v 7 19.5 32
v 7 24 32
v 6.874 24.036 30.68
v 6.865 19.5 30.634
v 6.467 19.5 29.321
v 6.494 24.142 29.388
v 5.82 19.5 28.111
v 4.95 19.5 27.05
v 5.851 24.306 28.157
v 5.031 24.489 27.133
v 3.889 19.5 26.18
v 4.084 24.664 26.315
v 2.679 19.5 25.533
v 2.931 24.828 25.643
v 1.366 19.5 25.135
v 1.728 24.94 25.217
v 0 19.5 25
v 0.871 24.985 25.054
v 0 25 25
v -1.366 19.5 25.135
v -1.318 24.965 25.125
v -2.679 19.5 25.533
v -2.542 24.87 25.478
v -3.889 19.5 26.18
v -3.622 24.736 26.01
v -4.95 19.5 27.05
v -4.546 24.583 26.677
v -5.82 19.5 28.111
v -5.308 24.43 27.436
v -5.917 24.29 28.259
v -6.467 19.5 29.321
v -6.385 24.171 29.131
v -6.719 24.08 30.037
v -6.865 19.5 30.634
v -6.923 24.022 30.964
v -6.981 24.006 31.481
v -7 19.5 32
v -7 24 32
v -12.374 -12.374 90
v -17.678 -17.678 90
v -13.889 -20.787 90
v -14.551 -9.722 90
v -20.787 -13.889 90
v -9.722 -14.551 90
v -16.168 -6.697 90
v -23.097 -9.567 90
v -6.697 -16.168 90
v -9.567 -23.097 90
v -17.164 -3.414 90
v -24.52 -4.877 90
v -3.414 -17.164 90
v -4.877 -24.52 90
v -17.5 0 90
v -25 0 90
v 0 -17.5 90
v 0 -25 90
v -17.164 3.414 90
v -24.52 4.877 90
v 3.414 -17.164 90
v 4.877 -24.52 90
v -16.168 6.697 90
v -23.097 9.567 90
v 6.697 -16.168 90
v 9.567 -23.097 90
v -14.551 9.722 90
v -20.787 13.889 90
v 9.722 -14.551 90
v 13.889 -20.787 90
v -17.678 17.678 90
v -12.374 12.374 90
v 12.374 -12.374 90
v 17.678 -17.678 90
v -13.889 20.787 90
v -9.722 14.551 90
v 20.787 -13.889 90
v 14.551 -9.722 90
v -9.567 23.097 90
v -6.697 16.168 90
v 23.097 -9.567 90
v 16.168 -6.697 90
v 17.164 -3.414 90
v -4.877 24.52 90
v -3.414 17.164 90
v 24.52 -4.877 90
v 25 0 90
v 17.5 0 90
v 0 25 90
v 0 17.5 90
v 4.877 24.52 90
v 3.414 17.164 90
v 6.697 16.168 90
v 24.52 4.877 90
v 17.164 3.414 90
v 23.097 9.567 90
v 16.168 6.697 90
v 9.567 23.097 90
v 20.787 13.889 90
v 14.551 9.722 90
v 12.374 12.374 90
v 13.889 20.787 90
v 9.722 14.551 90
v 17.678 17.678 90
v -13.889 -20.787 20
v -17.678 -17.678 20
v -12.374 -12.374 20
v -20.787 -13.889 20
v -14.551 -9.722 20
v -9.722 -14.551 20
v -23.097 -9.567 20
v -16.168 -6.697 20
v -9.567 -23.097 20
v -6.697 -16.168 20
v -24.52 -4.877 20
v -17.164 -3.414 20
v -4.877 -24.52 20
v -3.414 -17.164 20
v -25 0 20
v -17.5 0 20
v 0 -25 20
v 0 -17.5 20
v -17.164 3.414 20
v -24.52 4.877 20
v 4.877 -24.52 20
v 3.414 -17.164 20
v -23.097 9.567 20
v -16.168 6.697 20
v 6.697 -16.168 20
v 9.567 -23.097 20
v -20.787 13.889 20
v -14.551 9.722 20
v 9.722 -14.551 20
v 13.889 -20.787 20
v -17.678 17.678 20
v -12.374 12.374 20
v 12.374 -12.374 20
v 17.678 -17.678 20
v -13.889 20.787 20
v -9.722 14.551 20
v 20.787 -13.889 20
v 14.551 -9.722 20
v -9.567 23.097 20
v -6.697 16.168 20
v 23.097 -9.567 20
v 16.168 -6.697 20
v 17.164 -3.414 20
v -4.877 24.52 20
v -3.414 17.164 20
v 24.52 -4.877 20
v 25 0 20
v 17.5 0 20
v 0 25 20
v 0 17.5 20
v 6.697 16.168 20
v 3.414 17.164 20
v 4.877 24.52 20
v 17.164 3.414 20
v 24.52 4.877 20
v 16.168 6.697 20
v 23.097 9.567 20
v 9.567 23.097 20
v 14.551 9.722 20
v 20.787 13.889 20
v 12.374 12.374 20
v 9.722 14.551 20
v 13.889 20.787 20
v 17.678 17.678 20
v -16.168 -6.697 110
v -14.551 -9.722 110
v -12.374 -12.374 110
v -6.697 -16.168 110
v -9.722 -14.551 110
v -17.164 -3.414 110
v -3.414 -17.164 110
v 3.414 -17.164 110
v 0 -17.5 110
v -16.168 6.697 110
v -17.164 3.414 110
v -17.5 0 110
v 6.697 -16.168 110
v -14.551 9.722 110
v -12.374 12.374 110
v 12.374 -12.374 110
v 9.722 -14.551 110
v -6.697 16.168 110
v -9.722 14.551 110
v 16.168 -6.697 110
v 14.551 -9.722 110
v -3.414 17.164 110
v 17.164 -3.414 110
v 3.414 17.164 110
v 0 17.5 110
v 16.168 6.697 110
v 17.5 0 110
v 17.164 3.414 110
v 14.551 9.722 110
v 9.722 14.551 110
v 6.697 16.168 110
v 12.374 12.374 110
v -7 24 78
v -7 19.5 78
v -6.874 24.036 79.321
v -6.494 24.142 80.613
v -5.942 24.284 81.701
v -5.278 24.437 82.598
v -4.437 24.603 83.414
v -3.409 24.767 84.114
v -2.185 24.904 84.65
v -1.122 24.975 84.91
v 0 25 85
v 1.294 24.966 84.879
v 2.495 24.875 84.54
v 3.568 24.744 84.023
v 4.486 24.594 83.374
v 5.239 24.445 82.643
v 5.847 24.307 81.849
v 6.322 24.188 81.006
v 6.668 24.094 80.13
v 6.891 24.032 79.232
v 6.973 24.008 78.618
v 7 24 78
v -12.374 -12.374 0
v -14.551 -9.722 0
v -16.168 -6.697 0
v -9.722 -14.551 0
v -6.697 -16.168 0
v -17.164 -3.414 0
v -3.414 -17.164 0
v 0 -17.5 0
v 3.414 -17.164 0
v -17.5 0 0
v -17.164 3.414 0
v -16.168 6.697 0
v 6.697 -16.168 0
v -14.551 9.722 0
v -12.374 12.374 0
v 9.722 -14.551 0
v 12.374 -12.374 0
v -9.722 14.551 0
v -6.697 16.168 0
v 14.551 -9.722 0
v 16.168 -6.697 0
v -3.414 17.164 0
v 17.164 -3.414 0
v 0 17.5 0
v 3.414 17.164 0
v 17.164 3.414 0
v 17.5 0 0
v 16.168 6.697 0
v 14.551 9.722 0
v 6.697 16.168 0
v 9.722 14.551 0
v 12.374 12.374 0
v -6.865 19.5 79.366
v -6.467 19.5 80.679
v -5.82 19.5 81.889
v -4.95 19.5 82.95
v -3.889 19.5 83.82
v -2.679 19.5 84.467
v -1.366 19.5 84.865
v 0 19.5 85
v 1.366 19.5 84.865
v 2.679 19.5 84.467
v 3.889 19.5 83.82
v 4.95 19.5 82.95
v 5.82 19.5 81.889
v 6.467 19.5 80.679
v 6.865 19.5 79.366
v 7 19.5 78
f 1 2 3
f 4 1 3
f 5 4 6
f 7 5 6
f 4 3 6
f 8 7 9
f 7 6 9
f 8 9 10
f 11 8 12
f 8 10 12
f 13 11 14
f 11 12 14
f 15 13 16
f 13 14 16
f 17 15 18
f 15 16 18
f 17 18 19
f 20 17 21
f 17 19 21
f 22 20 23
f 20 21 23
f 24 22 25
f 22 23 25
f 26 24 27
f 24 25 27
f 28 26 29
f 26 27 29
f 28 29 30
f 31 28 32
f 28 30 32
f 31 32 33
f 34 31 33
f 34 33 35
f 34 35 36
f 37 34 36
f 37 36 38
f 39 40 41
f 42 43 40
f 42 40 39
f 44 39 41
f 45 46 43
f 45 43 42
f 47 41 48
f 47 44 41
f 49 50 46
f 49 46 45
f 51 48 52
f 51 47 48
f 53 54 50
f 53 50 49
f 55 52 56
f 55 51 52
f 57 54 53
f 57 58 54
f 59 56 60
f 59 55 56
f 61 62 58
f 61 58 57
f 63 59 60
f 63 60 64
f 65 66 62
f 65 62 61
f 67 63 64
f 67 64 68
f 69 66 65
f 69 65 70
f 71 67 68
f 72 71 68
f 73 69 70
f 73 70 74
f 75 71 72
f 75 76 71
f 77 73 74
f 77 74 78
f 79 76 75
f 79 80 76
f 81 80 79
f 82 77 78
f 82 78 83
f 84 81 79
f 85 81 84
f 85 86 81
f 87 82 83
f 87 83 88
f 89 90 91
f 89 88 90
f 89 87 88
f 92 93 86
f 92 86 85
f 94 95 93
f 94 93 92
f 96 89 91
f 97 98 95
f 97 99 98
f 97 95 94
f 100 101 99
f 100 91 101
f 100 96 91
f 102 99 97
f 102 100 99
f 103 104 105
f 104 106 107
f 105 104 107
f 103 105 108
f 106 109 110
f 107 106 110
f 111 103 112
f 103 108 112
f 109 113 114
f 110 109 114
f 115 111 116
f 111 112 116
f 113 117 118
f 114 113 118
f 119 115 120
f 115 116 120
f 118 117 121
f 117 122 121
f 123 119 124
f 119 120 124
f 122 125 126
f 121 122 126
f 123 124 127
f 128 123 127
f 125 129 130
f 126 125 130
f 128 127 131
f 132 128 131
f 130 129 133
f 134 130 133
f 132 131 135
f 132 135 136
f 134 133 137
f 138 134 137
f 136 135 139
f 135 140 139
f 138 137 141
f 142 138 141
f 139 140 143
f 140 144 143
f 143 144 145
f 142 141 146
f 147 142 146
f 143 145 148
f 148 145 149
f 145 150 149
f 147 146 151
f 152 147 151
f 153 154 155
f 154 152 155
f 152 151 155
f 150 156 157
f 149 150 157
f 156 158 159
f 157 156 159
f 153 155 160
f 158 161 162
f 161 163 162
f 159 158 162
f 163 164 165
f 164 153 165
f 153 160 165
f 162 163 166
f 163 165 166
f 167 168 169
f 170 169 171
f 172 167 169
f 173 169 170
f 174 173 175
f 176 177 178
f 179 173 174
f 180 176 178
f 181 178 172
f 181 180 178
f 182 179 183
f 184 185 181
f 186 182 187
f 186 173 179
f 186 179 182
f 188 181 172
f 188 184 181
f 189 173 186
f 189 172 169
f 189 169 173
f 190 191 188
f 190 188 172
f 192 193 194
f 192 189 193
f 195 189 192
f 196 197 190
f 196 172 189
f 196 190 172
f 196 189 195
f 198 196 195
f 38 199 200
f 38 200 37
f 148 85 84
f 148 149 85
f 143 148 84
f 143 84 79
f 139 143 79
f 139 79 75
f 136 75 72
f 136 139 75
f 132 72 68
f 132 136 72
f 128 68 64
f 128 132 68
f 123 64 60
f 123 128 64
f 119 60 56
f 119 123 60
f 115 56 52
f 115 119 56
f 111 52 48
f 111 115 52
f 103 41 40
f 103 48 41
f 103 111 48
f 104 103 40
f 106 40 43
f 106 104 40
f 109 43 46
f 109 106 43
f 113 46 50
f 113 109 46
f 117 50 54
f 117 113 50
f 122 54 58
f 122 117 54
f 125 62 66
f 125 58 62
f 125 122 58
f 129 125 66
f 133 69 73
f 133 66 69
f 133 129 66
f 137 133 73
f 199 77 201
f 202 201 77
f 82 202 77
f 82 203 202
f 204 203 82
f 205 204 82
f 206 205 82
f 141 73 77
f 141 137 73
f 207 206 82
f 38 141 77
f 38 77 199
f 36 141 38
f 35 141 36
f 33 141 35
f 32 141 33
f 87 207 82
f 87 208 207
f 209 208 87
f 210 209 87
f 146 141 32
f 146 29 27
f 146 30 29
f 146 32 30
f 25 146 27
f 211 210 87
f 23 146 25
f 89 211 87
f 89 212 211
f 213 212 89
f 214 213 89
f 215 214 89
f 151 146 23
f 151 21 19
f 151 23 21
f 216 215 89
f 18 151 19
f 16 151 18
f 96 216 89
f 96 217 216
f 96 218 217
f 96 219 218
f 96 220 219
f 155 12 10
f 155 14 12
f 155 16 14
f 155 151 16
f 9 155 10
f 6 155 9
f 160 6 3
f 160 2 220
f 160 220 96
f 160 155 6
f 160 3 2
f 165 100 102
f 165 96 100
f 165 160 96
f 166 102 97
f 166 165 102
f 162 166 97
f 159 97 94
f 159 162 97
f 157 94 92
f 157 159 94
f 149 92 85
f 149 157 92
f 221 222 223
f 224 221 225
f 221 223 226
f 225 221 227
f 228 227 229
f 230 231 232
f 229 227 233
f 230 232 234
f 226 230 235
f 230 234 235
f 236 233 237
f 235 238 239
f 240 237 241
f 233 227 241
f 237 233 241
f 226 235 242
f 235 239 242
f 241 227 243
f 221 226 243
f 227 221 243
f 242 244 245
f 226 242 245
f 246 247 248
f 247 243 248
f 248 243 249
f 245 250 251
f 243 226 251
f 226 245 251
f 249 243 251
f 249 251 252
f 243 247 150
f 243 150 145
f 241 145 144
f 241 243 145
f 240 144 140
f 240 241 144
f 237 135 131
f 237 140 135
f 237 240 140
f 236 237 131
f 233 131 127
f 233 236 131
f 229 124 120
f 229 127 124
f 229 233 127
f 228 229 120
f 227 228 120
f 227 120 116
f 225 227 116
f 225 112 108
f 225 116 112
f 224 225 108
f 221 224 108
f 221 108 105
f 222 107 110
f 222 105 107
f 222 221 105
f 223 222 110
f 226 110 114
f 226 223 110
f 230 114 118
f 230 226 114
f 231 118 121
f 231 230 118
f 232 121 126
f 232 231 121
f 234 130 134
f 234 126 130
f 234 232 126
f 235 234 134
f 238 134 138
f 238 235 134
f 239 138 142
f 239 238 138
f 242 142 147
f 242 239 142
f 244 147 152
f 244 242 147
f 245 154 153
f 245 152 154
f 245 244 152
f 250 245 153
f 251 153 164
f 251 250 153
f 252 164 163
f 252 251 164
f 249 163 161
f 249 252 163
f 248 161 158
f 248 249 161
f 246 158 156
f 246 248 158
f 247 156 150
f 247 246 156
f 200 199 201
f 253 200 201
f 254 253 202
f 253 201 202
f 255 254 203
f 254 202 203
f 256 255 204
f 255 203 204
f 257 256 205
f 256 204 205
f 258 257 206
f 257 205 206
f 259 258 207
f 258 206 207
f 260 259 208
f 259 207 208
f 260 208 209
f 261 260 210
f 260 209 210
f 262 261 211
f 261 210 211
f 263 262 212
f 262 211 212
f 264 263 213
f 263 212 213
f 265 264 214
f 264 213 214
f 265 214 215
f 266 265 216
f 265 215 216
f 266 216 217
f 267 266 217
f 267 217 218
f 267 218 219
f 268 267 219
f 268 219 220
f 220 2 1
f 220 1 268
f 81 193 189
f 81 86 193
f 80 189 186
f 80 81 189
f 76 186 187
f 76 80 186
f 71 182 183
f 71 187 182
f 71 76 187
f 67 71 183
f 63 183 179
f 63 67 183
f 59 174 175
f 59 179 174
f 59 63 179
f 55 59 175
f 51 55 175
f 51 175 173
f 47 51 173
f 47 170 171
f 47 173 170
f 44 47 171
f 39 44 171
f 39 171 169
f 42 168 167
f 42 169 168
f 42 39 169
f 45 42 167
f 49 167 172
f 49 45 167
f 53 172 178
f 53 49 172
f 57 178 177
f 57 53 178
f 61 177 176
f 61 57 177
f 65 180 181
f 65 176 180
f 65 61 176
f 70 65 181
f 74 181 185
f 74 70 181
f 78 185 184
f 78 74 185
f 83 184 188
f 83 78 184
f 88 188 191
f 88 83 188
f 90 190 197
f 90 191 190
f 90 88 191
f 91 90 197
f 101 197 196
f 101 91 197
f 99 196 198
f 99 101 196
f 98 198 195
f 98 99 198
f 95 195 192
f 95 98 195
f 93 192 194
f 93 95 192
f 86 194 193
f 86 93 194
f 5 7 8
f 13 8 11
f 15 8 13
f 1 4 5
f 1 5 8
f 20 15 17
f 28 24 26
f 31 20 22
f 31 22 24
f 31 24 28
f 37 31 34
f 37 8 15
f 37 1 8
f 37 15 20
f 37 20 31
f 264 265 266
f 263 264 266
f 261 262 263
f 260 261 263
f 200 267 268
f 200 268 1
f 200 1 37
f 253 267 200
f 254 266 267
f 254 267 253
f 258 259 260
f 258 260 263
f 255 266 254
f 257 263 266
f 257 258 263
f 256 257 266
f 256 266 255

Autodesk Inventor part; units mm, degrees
sketch "スケッチ1" plane through (0, 0, 0) normal (0, 0, 1) x (1, 0, 0)
  circle A0 centre (0, 0) radius 17.5
  dimension "d0" = 35
extrude "押し出し1" add sketch "スケッチ1" along normal blind 20
sketch "スケッチ2" plane through (0, 0, 20) normal (0, 0, 1) x (1, 0, 0)
  circle A0 centre (0, 0) radius 25
  dimension "d3" = 50
extrude "押し出し2" add sketch "スケッチ2" along normal blind 70
sketch "スケッチ3" plane through (0, 0, 90) normal (0, 0, 1) x (1, 0, 0)
  circle A0 centre (0, 0) radius 17.5
  dimension "d6" = 35
extrude "押し出し3" add sketch "スケッチ3" along normal blind 20
sketch "スケッチ4" plane through (0, 0, 0) normal (1, 0, 0) x (0, 1, 0)
  point P0 (0, 0)
ref_plane "作業平面2" through (0, 0, 55) normal (0, 0, 1) x (1, 0, 0)
ref_plane "作業平面1" through (0, 0, 110) normal (0, 0, 1) x (1, 0, 0)
ref_plane "作業平面3" through (0, 25, 0) normal (0, 1, 0) x (-1, 0, 0)
sketch "スケッチ8" plane through (0, 25, 0) normal (0, 1, 0) x (-1, 0, 0)
  line L0 (-7, 25) -> (7, 25)
  line L1 (0, 25) -> (0, 32)
  line L2 (0, 25) -> (7, 25) construction
  line L3 (-7, 25) -> (-7, 85)
  arc A0 (-7, 32) -> (7, 32) centre (0, 32) ccw
  line L4 (7, 85) -> (7, 25)
  line L5 (7, 32) -> (7, 25)
  line L6 (7, 25) -> (0, 25)
  line L7 (-7, 25) -> (-7, 32)
  line L8 (0, 25) -> (-7, 25)
  line L9 (7, 85) -> (-7, 85)
  line L10 (7, 55) -> (-7, 55)
  arc A1 (7, 78) -> (-7, 78) centre (0, 78) ccw
  point P0 (0, 0)
  dimension "d17" = 7
  dimension "d18" = 90
  dimension "d21" = 30
extrude "押し出し5" cut sketch "スケッチ8" against normal blind 5.5 contours A0 L3 L10 L4 | L3 A1 L4 L10
properties part number "shaft1"
